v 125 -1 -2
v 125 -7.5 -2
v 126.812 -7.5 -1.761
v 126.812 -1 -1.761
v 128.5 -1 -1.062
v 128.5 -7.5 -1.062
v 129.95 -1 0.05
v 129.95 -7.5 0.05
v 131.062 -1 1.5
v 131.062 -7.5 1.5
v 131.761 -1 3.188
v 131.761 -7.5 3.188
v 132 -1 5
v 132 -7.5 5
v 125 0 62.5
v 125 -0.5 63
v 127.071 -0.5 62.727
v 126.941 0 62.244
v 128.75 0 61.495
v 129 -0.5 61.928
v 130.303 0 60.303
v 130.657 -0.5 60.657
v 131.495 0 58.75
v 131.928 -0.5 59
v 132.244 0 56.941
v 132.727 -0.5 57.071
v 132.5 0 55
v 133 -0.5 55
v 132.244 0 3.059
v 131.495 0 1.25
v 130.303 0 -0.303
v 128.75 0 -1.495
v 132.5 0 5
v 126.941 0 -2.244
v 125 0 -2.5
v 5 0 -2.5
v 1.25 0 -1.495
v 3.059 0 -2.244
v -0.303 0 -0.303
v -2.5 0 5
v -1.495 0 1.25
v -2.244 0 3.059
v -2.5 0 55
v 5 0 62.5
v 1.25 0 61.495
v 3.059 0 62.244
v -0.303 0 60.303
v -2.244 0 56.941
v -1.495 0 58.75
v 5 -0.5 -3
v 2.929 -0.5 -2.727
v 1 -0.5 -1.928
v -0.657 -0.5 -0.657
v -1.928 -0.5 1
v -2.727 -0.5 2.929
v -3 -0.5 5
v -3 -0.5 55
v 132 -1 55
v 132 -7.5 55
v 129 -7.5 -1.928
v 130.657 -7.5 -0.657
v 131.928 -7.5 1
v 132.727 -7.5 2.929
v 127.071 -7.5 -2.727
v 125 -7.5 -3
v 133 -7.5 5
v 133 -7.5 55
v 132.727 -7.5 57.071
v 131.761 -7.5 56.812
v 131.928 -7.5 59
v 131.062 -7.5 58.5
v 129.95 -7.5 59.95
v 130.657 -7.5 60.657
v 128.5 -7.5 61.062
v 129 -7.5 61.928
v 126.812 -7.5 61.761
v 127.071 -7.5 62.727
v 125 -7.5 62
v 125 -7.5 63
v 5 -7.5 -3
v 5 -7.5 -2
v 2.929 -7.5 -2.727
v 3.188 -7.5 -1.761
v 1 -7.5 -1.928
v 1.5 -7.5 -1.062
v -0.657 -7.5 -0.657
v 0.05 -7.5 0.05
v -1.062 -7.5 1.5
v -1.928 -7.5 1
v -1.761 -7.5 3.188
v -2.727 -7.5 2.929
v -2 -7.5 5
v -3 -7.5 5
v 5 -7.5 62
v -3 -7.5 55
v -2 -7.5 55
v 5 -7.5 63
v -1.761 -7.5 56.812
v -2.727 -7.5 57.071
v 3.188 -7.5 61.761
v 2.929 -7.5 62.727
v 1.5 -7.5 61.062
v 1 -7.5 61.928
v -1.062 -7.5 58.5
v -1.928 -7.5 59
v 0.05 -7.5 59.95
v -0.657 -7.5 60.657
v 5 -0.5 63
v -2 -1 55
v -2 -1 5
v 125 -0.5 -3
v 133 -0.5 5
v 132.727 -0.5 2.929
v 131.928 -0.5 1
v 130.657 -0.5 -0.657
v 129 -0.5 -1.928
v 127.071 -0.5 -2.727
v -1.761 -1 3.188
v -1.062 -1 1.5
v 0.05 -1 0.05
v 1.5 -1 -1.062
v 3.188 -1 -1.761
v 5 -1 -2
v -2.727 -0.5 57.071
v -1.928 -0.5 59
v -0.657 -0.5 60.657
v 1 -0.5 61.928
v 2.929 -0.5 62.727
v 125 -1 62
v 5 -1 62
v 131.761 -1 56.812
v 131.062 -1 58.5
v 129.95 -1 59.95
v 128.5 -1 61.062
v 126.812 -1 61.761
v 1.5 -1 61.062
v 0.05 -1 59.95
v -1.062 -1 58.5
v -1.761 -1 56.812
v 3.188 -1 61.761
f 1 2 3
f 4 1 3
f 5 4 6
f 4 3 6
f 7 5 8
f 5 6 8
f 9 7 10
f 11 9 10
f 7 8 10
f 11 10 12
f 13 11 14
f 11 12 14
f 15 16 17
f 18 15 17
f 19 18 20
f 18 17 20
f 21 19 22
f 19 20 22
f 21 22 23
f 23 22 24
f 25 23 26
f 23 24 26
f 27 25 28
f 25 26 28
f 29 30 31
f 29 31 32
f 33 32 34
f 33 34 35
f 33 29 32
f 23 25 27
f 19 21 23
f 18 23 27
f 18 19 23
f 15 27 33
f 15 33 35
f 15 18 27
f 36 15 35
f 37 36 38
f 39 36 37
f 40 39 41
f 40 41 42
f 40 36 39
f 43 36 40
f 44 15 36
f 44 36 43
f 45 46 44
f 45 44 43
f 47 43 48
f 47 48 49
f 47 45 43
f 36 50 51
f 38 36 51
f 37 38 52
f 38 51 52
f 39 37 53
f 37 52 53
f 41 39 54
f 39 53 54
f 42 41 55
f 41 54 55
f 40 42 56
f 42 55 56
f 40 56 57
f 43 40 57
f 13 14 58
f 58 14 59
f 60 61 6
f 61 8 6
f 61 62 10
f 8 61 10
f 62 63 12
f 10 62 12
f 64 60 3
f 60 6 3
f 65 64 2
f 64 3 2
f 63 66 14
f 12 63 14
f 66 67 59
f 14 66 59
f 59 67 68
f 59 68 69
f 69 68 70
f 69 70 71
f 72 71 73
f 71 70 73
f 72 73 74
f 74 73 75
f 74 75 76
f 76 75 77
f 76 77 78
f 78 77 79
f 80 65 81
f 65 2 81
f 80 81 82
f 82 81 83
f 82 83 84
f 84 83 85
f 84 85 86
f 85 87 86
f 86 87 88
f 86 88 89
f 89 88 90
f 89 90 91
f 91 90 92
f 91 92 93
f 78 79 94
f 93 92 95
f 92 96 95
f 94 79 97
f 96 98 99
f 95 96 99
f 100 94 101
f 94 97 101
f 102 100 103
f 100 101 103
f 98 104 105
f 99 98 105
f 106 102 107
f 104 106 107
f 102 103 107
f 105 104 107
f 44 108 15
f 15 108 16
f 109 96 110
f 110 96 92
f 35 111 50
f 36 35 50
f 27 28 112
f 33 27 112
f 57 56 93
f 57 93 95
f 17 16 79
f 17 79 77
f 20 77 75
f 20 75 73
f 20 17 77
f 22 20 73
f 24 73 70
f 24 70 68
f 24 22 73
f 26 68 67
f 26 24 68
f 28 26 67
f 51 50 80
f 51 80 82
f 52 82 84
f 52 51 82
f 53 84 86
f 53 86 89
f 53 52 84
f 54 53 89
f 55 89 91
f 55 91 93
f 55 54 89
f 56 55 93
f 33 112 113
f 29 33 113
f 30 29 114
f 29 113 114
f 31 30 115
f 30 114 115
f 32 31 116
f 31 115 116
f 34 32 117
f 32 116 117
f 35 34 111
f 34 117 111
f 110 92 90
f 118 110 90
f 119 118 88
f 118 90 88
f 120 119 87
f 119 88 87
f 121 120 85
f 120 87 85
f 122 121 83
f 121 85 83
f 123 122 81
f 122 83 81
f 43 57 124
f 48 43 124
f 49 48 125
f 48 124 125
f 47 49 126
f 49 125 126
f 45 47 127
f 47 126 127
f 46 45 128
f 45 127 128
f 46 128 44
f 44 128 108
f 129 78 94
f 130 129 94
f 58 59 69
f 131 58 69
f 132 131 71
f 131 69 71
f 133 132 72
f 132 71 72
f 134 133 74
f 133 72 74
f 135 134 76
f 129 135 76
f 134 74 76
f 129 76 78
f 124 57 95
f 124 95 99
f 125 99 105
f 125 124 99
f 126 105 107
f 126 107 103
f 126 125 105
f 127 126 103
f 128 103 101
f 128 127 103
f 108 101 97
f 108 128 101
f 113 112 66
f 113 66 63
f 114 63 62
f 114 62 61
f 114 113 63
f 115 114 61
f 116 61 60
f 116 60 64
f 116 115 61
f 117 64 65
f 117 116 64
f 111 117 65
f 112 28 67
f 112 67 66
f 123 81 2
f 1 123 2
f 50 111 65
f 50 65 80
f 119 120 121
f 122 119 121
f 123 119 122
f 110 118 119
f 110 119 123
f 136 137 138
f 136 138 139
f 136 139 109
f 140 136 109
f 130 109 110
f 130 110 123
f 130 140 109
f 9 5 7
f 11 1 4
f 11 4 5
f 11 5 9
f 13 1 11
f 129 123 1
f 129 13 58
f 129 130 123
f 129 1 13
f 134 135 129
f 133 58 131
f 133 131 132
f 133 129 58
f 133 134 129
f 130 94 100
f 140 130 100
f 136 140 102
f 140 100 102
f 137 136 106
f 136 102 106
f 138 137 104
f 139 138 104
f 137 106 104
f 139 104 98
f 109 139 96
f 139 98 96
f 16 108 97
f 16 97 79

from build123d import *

# Parameters (mm, degrees)
F1_DEPTH = 1
F3_DEPTH = 7.5
F5_DEPTH = 6.5
F6_SIZE  = 0.5


with BuildPart() as f1:
    # F0 (on Front) → F1 (new body)
    with BuildSketch(Plane.XZ):
        with BuildLine():
            ThreePointArc((0, 5), (1.464466, 1.464466), (5, 0))
            Line((5, 0), (125, 0))
            ThreePointArc((125, 0), (128.535534, 1.464466), (130, 5))
            Line((130, 5), (130, 55))
            ThreePointArc((130, 55), (128.535534, 58.535534), (125, 60))
            Line((125, 60), (5, 60))
            ThreePointArc((5, 60), (1.464466, 58.535534), (0, 55))
            Line((0, 55), (0, 5))
        make_face()
    extrude(amount=F1_DEPTH)

    # F2 (on face) → F3 (join)
    with BuildSketch(Plane(origin=(0, 0, 0), x_dir=(-1, 0, 0), z_dir=(0, 1, 0))):
        with BuildLine():
            ThreePointArc((3, 55), (0.656854, 60.656854), (-5, 63))
            Line((-5, 63), (-125, 63))
            ThreePointArc((-125, 63), (-130.656854, 60.656854), (-133, 55))
            Line((-133, 55), (-133, 5))
            ThreePointArc((-133, 5), (-130.656854, -0.656854), (-125, -3))
            Line((-125, -3), (-5, -3))
            ThreePointArc((-5, -3), (0.656854, -0.656854), (3, 5))
            Line((3, 5), (3, 55))
        make_face()
        with BuildLine():
            Line((0, 55), (0, 5))
            ThreePointArc((0, 5), (-1.464466, 1.464466), (-5, 0))
            Line((-5, 0), (-125, 0))
            ThreePointArc((-125, 0), (-128.535534, 1.464466), (-130, 5))
            Line((-130, 5), (-130, 55))
            ThreePointArc((-130, 55), (-128.535534, 58.535534), (-125, 60))
            Line((-125, 60), (-5, 60))
            ThreePointArc((-5, 60), (-1.464466, 58.535534), (0, 55))
        make_face(mode=Mode.SUBTRACT)
    extrude(amount=-F3_DEPTH)

    # F4 (on face) → F5 (cut, through all)
    with BuildSketch(Plane.XZ.offset(7.5)):
        with BuildLine():
            Line((125, 62), (5, 62))
            ThreePointArc((5, 62), (0.050253, 59.949747), (-2, 55))
            Line((-2, 55), (-2, 5))
            ThreePointArc((-2, 5), (0.050253, 0.050253), (5, -2))
            Line((5, -2), (125, -2))
            ThreePointArc((125, -2), (129.949747, 0.050253), (132, 5))
            Line((132, 5), (132, 55))
            ThreePointArc((132, 55), (129.949747, 59.949747), (125, 62))
        make_face()
        with BuildLine():
            ThreePointArc((5, 0), (1.464466, 1.464466), (0, 5))
            Line((0, 5), (0, 55))
            ThreePointArc((0, 55), (1.464466, 58.535534), (5, 60))
            Line((5, 60), (125, 60))
            ThreePointArc((125, 60), (128.535534, 58.535534), (130, 55))
            Line((130, 55), (130, 5))
            ThreePointArc((130, 5), (128.535534, 1.464466), (125, 0))
            Line((125, 0), (5, 0))
        make_face(mode=Mode.SUBTRACT)
    extrude(amount=-F5_DEPTH, mode=Mode.SUBTRACT)

    # F6
    f6_edges = [f1.edges().sort_by_distance(p)[0] for p in [
        (-0.656854, 0, -0.656854),
        (65, 0, -3),
        (130.656854, 0, -0.656854),
        (133, 0, 30),
        (130.656854, 0, 60.656854),
        (65, 0, 63),
        (-0.656854, 0, 60.656854),
        (-3, 0, 30),
    ]]
    chamfer(f6_edges, length=F6_SIZE)


solid = f1.part
